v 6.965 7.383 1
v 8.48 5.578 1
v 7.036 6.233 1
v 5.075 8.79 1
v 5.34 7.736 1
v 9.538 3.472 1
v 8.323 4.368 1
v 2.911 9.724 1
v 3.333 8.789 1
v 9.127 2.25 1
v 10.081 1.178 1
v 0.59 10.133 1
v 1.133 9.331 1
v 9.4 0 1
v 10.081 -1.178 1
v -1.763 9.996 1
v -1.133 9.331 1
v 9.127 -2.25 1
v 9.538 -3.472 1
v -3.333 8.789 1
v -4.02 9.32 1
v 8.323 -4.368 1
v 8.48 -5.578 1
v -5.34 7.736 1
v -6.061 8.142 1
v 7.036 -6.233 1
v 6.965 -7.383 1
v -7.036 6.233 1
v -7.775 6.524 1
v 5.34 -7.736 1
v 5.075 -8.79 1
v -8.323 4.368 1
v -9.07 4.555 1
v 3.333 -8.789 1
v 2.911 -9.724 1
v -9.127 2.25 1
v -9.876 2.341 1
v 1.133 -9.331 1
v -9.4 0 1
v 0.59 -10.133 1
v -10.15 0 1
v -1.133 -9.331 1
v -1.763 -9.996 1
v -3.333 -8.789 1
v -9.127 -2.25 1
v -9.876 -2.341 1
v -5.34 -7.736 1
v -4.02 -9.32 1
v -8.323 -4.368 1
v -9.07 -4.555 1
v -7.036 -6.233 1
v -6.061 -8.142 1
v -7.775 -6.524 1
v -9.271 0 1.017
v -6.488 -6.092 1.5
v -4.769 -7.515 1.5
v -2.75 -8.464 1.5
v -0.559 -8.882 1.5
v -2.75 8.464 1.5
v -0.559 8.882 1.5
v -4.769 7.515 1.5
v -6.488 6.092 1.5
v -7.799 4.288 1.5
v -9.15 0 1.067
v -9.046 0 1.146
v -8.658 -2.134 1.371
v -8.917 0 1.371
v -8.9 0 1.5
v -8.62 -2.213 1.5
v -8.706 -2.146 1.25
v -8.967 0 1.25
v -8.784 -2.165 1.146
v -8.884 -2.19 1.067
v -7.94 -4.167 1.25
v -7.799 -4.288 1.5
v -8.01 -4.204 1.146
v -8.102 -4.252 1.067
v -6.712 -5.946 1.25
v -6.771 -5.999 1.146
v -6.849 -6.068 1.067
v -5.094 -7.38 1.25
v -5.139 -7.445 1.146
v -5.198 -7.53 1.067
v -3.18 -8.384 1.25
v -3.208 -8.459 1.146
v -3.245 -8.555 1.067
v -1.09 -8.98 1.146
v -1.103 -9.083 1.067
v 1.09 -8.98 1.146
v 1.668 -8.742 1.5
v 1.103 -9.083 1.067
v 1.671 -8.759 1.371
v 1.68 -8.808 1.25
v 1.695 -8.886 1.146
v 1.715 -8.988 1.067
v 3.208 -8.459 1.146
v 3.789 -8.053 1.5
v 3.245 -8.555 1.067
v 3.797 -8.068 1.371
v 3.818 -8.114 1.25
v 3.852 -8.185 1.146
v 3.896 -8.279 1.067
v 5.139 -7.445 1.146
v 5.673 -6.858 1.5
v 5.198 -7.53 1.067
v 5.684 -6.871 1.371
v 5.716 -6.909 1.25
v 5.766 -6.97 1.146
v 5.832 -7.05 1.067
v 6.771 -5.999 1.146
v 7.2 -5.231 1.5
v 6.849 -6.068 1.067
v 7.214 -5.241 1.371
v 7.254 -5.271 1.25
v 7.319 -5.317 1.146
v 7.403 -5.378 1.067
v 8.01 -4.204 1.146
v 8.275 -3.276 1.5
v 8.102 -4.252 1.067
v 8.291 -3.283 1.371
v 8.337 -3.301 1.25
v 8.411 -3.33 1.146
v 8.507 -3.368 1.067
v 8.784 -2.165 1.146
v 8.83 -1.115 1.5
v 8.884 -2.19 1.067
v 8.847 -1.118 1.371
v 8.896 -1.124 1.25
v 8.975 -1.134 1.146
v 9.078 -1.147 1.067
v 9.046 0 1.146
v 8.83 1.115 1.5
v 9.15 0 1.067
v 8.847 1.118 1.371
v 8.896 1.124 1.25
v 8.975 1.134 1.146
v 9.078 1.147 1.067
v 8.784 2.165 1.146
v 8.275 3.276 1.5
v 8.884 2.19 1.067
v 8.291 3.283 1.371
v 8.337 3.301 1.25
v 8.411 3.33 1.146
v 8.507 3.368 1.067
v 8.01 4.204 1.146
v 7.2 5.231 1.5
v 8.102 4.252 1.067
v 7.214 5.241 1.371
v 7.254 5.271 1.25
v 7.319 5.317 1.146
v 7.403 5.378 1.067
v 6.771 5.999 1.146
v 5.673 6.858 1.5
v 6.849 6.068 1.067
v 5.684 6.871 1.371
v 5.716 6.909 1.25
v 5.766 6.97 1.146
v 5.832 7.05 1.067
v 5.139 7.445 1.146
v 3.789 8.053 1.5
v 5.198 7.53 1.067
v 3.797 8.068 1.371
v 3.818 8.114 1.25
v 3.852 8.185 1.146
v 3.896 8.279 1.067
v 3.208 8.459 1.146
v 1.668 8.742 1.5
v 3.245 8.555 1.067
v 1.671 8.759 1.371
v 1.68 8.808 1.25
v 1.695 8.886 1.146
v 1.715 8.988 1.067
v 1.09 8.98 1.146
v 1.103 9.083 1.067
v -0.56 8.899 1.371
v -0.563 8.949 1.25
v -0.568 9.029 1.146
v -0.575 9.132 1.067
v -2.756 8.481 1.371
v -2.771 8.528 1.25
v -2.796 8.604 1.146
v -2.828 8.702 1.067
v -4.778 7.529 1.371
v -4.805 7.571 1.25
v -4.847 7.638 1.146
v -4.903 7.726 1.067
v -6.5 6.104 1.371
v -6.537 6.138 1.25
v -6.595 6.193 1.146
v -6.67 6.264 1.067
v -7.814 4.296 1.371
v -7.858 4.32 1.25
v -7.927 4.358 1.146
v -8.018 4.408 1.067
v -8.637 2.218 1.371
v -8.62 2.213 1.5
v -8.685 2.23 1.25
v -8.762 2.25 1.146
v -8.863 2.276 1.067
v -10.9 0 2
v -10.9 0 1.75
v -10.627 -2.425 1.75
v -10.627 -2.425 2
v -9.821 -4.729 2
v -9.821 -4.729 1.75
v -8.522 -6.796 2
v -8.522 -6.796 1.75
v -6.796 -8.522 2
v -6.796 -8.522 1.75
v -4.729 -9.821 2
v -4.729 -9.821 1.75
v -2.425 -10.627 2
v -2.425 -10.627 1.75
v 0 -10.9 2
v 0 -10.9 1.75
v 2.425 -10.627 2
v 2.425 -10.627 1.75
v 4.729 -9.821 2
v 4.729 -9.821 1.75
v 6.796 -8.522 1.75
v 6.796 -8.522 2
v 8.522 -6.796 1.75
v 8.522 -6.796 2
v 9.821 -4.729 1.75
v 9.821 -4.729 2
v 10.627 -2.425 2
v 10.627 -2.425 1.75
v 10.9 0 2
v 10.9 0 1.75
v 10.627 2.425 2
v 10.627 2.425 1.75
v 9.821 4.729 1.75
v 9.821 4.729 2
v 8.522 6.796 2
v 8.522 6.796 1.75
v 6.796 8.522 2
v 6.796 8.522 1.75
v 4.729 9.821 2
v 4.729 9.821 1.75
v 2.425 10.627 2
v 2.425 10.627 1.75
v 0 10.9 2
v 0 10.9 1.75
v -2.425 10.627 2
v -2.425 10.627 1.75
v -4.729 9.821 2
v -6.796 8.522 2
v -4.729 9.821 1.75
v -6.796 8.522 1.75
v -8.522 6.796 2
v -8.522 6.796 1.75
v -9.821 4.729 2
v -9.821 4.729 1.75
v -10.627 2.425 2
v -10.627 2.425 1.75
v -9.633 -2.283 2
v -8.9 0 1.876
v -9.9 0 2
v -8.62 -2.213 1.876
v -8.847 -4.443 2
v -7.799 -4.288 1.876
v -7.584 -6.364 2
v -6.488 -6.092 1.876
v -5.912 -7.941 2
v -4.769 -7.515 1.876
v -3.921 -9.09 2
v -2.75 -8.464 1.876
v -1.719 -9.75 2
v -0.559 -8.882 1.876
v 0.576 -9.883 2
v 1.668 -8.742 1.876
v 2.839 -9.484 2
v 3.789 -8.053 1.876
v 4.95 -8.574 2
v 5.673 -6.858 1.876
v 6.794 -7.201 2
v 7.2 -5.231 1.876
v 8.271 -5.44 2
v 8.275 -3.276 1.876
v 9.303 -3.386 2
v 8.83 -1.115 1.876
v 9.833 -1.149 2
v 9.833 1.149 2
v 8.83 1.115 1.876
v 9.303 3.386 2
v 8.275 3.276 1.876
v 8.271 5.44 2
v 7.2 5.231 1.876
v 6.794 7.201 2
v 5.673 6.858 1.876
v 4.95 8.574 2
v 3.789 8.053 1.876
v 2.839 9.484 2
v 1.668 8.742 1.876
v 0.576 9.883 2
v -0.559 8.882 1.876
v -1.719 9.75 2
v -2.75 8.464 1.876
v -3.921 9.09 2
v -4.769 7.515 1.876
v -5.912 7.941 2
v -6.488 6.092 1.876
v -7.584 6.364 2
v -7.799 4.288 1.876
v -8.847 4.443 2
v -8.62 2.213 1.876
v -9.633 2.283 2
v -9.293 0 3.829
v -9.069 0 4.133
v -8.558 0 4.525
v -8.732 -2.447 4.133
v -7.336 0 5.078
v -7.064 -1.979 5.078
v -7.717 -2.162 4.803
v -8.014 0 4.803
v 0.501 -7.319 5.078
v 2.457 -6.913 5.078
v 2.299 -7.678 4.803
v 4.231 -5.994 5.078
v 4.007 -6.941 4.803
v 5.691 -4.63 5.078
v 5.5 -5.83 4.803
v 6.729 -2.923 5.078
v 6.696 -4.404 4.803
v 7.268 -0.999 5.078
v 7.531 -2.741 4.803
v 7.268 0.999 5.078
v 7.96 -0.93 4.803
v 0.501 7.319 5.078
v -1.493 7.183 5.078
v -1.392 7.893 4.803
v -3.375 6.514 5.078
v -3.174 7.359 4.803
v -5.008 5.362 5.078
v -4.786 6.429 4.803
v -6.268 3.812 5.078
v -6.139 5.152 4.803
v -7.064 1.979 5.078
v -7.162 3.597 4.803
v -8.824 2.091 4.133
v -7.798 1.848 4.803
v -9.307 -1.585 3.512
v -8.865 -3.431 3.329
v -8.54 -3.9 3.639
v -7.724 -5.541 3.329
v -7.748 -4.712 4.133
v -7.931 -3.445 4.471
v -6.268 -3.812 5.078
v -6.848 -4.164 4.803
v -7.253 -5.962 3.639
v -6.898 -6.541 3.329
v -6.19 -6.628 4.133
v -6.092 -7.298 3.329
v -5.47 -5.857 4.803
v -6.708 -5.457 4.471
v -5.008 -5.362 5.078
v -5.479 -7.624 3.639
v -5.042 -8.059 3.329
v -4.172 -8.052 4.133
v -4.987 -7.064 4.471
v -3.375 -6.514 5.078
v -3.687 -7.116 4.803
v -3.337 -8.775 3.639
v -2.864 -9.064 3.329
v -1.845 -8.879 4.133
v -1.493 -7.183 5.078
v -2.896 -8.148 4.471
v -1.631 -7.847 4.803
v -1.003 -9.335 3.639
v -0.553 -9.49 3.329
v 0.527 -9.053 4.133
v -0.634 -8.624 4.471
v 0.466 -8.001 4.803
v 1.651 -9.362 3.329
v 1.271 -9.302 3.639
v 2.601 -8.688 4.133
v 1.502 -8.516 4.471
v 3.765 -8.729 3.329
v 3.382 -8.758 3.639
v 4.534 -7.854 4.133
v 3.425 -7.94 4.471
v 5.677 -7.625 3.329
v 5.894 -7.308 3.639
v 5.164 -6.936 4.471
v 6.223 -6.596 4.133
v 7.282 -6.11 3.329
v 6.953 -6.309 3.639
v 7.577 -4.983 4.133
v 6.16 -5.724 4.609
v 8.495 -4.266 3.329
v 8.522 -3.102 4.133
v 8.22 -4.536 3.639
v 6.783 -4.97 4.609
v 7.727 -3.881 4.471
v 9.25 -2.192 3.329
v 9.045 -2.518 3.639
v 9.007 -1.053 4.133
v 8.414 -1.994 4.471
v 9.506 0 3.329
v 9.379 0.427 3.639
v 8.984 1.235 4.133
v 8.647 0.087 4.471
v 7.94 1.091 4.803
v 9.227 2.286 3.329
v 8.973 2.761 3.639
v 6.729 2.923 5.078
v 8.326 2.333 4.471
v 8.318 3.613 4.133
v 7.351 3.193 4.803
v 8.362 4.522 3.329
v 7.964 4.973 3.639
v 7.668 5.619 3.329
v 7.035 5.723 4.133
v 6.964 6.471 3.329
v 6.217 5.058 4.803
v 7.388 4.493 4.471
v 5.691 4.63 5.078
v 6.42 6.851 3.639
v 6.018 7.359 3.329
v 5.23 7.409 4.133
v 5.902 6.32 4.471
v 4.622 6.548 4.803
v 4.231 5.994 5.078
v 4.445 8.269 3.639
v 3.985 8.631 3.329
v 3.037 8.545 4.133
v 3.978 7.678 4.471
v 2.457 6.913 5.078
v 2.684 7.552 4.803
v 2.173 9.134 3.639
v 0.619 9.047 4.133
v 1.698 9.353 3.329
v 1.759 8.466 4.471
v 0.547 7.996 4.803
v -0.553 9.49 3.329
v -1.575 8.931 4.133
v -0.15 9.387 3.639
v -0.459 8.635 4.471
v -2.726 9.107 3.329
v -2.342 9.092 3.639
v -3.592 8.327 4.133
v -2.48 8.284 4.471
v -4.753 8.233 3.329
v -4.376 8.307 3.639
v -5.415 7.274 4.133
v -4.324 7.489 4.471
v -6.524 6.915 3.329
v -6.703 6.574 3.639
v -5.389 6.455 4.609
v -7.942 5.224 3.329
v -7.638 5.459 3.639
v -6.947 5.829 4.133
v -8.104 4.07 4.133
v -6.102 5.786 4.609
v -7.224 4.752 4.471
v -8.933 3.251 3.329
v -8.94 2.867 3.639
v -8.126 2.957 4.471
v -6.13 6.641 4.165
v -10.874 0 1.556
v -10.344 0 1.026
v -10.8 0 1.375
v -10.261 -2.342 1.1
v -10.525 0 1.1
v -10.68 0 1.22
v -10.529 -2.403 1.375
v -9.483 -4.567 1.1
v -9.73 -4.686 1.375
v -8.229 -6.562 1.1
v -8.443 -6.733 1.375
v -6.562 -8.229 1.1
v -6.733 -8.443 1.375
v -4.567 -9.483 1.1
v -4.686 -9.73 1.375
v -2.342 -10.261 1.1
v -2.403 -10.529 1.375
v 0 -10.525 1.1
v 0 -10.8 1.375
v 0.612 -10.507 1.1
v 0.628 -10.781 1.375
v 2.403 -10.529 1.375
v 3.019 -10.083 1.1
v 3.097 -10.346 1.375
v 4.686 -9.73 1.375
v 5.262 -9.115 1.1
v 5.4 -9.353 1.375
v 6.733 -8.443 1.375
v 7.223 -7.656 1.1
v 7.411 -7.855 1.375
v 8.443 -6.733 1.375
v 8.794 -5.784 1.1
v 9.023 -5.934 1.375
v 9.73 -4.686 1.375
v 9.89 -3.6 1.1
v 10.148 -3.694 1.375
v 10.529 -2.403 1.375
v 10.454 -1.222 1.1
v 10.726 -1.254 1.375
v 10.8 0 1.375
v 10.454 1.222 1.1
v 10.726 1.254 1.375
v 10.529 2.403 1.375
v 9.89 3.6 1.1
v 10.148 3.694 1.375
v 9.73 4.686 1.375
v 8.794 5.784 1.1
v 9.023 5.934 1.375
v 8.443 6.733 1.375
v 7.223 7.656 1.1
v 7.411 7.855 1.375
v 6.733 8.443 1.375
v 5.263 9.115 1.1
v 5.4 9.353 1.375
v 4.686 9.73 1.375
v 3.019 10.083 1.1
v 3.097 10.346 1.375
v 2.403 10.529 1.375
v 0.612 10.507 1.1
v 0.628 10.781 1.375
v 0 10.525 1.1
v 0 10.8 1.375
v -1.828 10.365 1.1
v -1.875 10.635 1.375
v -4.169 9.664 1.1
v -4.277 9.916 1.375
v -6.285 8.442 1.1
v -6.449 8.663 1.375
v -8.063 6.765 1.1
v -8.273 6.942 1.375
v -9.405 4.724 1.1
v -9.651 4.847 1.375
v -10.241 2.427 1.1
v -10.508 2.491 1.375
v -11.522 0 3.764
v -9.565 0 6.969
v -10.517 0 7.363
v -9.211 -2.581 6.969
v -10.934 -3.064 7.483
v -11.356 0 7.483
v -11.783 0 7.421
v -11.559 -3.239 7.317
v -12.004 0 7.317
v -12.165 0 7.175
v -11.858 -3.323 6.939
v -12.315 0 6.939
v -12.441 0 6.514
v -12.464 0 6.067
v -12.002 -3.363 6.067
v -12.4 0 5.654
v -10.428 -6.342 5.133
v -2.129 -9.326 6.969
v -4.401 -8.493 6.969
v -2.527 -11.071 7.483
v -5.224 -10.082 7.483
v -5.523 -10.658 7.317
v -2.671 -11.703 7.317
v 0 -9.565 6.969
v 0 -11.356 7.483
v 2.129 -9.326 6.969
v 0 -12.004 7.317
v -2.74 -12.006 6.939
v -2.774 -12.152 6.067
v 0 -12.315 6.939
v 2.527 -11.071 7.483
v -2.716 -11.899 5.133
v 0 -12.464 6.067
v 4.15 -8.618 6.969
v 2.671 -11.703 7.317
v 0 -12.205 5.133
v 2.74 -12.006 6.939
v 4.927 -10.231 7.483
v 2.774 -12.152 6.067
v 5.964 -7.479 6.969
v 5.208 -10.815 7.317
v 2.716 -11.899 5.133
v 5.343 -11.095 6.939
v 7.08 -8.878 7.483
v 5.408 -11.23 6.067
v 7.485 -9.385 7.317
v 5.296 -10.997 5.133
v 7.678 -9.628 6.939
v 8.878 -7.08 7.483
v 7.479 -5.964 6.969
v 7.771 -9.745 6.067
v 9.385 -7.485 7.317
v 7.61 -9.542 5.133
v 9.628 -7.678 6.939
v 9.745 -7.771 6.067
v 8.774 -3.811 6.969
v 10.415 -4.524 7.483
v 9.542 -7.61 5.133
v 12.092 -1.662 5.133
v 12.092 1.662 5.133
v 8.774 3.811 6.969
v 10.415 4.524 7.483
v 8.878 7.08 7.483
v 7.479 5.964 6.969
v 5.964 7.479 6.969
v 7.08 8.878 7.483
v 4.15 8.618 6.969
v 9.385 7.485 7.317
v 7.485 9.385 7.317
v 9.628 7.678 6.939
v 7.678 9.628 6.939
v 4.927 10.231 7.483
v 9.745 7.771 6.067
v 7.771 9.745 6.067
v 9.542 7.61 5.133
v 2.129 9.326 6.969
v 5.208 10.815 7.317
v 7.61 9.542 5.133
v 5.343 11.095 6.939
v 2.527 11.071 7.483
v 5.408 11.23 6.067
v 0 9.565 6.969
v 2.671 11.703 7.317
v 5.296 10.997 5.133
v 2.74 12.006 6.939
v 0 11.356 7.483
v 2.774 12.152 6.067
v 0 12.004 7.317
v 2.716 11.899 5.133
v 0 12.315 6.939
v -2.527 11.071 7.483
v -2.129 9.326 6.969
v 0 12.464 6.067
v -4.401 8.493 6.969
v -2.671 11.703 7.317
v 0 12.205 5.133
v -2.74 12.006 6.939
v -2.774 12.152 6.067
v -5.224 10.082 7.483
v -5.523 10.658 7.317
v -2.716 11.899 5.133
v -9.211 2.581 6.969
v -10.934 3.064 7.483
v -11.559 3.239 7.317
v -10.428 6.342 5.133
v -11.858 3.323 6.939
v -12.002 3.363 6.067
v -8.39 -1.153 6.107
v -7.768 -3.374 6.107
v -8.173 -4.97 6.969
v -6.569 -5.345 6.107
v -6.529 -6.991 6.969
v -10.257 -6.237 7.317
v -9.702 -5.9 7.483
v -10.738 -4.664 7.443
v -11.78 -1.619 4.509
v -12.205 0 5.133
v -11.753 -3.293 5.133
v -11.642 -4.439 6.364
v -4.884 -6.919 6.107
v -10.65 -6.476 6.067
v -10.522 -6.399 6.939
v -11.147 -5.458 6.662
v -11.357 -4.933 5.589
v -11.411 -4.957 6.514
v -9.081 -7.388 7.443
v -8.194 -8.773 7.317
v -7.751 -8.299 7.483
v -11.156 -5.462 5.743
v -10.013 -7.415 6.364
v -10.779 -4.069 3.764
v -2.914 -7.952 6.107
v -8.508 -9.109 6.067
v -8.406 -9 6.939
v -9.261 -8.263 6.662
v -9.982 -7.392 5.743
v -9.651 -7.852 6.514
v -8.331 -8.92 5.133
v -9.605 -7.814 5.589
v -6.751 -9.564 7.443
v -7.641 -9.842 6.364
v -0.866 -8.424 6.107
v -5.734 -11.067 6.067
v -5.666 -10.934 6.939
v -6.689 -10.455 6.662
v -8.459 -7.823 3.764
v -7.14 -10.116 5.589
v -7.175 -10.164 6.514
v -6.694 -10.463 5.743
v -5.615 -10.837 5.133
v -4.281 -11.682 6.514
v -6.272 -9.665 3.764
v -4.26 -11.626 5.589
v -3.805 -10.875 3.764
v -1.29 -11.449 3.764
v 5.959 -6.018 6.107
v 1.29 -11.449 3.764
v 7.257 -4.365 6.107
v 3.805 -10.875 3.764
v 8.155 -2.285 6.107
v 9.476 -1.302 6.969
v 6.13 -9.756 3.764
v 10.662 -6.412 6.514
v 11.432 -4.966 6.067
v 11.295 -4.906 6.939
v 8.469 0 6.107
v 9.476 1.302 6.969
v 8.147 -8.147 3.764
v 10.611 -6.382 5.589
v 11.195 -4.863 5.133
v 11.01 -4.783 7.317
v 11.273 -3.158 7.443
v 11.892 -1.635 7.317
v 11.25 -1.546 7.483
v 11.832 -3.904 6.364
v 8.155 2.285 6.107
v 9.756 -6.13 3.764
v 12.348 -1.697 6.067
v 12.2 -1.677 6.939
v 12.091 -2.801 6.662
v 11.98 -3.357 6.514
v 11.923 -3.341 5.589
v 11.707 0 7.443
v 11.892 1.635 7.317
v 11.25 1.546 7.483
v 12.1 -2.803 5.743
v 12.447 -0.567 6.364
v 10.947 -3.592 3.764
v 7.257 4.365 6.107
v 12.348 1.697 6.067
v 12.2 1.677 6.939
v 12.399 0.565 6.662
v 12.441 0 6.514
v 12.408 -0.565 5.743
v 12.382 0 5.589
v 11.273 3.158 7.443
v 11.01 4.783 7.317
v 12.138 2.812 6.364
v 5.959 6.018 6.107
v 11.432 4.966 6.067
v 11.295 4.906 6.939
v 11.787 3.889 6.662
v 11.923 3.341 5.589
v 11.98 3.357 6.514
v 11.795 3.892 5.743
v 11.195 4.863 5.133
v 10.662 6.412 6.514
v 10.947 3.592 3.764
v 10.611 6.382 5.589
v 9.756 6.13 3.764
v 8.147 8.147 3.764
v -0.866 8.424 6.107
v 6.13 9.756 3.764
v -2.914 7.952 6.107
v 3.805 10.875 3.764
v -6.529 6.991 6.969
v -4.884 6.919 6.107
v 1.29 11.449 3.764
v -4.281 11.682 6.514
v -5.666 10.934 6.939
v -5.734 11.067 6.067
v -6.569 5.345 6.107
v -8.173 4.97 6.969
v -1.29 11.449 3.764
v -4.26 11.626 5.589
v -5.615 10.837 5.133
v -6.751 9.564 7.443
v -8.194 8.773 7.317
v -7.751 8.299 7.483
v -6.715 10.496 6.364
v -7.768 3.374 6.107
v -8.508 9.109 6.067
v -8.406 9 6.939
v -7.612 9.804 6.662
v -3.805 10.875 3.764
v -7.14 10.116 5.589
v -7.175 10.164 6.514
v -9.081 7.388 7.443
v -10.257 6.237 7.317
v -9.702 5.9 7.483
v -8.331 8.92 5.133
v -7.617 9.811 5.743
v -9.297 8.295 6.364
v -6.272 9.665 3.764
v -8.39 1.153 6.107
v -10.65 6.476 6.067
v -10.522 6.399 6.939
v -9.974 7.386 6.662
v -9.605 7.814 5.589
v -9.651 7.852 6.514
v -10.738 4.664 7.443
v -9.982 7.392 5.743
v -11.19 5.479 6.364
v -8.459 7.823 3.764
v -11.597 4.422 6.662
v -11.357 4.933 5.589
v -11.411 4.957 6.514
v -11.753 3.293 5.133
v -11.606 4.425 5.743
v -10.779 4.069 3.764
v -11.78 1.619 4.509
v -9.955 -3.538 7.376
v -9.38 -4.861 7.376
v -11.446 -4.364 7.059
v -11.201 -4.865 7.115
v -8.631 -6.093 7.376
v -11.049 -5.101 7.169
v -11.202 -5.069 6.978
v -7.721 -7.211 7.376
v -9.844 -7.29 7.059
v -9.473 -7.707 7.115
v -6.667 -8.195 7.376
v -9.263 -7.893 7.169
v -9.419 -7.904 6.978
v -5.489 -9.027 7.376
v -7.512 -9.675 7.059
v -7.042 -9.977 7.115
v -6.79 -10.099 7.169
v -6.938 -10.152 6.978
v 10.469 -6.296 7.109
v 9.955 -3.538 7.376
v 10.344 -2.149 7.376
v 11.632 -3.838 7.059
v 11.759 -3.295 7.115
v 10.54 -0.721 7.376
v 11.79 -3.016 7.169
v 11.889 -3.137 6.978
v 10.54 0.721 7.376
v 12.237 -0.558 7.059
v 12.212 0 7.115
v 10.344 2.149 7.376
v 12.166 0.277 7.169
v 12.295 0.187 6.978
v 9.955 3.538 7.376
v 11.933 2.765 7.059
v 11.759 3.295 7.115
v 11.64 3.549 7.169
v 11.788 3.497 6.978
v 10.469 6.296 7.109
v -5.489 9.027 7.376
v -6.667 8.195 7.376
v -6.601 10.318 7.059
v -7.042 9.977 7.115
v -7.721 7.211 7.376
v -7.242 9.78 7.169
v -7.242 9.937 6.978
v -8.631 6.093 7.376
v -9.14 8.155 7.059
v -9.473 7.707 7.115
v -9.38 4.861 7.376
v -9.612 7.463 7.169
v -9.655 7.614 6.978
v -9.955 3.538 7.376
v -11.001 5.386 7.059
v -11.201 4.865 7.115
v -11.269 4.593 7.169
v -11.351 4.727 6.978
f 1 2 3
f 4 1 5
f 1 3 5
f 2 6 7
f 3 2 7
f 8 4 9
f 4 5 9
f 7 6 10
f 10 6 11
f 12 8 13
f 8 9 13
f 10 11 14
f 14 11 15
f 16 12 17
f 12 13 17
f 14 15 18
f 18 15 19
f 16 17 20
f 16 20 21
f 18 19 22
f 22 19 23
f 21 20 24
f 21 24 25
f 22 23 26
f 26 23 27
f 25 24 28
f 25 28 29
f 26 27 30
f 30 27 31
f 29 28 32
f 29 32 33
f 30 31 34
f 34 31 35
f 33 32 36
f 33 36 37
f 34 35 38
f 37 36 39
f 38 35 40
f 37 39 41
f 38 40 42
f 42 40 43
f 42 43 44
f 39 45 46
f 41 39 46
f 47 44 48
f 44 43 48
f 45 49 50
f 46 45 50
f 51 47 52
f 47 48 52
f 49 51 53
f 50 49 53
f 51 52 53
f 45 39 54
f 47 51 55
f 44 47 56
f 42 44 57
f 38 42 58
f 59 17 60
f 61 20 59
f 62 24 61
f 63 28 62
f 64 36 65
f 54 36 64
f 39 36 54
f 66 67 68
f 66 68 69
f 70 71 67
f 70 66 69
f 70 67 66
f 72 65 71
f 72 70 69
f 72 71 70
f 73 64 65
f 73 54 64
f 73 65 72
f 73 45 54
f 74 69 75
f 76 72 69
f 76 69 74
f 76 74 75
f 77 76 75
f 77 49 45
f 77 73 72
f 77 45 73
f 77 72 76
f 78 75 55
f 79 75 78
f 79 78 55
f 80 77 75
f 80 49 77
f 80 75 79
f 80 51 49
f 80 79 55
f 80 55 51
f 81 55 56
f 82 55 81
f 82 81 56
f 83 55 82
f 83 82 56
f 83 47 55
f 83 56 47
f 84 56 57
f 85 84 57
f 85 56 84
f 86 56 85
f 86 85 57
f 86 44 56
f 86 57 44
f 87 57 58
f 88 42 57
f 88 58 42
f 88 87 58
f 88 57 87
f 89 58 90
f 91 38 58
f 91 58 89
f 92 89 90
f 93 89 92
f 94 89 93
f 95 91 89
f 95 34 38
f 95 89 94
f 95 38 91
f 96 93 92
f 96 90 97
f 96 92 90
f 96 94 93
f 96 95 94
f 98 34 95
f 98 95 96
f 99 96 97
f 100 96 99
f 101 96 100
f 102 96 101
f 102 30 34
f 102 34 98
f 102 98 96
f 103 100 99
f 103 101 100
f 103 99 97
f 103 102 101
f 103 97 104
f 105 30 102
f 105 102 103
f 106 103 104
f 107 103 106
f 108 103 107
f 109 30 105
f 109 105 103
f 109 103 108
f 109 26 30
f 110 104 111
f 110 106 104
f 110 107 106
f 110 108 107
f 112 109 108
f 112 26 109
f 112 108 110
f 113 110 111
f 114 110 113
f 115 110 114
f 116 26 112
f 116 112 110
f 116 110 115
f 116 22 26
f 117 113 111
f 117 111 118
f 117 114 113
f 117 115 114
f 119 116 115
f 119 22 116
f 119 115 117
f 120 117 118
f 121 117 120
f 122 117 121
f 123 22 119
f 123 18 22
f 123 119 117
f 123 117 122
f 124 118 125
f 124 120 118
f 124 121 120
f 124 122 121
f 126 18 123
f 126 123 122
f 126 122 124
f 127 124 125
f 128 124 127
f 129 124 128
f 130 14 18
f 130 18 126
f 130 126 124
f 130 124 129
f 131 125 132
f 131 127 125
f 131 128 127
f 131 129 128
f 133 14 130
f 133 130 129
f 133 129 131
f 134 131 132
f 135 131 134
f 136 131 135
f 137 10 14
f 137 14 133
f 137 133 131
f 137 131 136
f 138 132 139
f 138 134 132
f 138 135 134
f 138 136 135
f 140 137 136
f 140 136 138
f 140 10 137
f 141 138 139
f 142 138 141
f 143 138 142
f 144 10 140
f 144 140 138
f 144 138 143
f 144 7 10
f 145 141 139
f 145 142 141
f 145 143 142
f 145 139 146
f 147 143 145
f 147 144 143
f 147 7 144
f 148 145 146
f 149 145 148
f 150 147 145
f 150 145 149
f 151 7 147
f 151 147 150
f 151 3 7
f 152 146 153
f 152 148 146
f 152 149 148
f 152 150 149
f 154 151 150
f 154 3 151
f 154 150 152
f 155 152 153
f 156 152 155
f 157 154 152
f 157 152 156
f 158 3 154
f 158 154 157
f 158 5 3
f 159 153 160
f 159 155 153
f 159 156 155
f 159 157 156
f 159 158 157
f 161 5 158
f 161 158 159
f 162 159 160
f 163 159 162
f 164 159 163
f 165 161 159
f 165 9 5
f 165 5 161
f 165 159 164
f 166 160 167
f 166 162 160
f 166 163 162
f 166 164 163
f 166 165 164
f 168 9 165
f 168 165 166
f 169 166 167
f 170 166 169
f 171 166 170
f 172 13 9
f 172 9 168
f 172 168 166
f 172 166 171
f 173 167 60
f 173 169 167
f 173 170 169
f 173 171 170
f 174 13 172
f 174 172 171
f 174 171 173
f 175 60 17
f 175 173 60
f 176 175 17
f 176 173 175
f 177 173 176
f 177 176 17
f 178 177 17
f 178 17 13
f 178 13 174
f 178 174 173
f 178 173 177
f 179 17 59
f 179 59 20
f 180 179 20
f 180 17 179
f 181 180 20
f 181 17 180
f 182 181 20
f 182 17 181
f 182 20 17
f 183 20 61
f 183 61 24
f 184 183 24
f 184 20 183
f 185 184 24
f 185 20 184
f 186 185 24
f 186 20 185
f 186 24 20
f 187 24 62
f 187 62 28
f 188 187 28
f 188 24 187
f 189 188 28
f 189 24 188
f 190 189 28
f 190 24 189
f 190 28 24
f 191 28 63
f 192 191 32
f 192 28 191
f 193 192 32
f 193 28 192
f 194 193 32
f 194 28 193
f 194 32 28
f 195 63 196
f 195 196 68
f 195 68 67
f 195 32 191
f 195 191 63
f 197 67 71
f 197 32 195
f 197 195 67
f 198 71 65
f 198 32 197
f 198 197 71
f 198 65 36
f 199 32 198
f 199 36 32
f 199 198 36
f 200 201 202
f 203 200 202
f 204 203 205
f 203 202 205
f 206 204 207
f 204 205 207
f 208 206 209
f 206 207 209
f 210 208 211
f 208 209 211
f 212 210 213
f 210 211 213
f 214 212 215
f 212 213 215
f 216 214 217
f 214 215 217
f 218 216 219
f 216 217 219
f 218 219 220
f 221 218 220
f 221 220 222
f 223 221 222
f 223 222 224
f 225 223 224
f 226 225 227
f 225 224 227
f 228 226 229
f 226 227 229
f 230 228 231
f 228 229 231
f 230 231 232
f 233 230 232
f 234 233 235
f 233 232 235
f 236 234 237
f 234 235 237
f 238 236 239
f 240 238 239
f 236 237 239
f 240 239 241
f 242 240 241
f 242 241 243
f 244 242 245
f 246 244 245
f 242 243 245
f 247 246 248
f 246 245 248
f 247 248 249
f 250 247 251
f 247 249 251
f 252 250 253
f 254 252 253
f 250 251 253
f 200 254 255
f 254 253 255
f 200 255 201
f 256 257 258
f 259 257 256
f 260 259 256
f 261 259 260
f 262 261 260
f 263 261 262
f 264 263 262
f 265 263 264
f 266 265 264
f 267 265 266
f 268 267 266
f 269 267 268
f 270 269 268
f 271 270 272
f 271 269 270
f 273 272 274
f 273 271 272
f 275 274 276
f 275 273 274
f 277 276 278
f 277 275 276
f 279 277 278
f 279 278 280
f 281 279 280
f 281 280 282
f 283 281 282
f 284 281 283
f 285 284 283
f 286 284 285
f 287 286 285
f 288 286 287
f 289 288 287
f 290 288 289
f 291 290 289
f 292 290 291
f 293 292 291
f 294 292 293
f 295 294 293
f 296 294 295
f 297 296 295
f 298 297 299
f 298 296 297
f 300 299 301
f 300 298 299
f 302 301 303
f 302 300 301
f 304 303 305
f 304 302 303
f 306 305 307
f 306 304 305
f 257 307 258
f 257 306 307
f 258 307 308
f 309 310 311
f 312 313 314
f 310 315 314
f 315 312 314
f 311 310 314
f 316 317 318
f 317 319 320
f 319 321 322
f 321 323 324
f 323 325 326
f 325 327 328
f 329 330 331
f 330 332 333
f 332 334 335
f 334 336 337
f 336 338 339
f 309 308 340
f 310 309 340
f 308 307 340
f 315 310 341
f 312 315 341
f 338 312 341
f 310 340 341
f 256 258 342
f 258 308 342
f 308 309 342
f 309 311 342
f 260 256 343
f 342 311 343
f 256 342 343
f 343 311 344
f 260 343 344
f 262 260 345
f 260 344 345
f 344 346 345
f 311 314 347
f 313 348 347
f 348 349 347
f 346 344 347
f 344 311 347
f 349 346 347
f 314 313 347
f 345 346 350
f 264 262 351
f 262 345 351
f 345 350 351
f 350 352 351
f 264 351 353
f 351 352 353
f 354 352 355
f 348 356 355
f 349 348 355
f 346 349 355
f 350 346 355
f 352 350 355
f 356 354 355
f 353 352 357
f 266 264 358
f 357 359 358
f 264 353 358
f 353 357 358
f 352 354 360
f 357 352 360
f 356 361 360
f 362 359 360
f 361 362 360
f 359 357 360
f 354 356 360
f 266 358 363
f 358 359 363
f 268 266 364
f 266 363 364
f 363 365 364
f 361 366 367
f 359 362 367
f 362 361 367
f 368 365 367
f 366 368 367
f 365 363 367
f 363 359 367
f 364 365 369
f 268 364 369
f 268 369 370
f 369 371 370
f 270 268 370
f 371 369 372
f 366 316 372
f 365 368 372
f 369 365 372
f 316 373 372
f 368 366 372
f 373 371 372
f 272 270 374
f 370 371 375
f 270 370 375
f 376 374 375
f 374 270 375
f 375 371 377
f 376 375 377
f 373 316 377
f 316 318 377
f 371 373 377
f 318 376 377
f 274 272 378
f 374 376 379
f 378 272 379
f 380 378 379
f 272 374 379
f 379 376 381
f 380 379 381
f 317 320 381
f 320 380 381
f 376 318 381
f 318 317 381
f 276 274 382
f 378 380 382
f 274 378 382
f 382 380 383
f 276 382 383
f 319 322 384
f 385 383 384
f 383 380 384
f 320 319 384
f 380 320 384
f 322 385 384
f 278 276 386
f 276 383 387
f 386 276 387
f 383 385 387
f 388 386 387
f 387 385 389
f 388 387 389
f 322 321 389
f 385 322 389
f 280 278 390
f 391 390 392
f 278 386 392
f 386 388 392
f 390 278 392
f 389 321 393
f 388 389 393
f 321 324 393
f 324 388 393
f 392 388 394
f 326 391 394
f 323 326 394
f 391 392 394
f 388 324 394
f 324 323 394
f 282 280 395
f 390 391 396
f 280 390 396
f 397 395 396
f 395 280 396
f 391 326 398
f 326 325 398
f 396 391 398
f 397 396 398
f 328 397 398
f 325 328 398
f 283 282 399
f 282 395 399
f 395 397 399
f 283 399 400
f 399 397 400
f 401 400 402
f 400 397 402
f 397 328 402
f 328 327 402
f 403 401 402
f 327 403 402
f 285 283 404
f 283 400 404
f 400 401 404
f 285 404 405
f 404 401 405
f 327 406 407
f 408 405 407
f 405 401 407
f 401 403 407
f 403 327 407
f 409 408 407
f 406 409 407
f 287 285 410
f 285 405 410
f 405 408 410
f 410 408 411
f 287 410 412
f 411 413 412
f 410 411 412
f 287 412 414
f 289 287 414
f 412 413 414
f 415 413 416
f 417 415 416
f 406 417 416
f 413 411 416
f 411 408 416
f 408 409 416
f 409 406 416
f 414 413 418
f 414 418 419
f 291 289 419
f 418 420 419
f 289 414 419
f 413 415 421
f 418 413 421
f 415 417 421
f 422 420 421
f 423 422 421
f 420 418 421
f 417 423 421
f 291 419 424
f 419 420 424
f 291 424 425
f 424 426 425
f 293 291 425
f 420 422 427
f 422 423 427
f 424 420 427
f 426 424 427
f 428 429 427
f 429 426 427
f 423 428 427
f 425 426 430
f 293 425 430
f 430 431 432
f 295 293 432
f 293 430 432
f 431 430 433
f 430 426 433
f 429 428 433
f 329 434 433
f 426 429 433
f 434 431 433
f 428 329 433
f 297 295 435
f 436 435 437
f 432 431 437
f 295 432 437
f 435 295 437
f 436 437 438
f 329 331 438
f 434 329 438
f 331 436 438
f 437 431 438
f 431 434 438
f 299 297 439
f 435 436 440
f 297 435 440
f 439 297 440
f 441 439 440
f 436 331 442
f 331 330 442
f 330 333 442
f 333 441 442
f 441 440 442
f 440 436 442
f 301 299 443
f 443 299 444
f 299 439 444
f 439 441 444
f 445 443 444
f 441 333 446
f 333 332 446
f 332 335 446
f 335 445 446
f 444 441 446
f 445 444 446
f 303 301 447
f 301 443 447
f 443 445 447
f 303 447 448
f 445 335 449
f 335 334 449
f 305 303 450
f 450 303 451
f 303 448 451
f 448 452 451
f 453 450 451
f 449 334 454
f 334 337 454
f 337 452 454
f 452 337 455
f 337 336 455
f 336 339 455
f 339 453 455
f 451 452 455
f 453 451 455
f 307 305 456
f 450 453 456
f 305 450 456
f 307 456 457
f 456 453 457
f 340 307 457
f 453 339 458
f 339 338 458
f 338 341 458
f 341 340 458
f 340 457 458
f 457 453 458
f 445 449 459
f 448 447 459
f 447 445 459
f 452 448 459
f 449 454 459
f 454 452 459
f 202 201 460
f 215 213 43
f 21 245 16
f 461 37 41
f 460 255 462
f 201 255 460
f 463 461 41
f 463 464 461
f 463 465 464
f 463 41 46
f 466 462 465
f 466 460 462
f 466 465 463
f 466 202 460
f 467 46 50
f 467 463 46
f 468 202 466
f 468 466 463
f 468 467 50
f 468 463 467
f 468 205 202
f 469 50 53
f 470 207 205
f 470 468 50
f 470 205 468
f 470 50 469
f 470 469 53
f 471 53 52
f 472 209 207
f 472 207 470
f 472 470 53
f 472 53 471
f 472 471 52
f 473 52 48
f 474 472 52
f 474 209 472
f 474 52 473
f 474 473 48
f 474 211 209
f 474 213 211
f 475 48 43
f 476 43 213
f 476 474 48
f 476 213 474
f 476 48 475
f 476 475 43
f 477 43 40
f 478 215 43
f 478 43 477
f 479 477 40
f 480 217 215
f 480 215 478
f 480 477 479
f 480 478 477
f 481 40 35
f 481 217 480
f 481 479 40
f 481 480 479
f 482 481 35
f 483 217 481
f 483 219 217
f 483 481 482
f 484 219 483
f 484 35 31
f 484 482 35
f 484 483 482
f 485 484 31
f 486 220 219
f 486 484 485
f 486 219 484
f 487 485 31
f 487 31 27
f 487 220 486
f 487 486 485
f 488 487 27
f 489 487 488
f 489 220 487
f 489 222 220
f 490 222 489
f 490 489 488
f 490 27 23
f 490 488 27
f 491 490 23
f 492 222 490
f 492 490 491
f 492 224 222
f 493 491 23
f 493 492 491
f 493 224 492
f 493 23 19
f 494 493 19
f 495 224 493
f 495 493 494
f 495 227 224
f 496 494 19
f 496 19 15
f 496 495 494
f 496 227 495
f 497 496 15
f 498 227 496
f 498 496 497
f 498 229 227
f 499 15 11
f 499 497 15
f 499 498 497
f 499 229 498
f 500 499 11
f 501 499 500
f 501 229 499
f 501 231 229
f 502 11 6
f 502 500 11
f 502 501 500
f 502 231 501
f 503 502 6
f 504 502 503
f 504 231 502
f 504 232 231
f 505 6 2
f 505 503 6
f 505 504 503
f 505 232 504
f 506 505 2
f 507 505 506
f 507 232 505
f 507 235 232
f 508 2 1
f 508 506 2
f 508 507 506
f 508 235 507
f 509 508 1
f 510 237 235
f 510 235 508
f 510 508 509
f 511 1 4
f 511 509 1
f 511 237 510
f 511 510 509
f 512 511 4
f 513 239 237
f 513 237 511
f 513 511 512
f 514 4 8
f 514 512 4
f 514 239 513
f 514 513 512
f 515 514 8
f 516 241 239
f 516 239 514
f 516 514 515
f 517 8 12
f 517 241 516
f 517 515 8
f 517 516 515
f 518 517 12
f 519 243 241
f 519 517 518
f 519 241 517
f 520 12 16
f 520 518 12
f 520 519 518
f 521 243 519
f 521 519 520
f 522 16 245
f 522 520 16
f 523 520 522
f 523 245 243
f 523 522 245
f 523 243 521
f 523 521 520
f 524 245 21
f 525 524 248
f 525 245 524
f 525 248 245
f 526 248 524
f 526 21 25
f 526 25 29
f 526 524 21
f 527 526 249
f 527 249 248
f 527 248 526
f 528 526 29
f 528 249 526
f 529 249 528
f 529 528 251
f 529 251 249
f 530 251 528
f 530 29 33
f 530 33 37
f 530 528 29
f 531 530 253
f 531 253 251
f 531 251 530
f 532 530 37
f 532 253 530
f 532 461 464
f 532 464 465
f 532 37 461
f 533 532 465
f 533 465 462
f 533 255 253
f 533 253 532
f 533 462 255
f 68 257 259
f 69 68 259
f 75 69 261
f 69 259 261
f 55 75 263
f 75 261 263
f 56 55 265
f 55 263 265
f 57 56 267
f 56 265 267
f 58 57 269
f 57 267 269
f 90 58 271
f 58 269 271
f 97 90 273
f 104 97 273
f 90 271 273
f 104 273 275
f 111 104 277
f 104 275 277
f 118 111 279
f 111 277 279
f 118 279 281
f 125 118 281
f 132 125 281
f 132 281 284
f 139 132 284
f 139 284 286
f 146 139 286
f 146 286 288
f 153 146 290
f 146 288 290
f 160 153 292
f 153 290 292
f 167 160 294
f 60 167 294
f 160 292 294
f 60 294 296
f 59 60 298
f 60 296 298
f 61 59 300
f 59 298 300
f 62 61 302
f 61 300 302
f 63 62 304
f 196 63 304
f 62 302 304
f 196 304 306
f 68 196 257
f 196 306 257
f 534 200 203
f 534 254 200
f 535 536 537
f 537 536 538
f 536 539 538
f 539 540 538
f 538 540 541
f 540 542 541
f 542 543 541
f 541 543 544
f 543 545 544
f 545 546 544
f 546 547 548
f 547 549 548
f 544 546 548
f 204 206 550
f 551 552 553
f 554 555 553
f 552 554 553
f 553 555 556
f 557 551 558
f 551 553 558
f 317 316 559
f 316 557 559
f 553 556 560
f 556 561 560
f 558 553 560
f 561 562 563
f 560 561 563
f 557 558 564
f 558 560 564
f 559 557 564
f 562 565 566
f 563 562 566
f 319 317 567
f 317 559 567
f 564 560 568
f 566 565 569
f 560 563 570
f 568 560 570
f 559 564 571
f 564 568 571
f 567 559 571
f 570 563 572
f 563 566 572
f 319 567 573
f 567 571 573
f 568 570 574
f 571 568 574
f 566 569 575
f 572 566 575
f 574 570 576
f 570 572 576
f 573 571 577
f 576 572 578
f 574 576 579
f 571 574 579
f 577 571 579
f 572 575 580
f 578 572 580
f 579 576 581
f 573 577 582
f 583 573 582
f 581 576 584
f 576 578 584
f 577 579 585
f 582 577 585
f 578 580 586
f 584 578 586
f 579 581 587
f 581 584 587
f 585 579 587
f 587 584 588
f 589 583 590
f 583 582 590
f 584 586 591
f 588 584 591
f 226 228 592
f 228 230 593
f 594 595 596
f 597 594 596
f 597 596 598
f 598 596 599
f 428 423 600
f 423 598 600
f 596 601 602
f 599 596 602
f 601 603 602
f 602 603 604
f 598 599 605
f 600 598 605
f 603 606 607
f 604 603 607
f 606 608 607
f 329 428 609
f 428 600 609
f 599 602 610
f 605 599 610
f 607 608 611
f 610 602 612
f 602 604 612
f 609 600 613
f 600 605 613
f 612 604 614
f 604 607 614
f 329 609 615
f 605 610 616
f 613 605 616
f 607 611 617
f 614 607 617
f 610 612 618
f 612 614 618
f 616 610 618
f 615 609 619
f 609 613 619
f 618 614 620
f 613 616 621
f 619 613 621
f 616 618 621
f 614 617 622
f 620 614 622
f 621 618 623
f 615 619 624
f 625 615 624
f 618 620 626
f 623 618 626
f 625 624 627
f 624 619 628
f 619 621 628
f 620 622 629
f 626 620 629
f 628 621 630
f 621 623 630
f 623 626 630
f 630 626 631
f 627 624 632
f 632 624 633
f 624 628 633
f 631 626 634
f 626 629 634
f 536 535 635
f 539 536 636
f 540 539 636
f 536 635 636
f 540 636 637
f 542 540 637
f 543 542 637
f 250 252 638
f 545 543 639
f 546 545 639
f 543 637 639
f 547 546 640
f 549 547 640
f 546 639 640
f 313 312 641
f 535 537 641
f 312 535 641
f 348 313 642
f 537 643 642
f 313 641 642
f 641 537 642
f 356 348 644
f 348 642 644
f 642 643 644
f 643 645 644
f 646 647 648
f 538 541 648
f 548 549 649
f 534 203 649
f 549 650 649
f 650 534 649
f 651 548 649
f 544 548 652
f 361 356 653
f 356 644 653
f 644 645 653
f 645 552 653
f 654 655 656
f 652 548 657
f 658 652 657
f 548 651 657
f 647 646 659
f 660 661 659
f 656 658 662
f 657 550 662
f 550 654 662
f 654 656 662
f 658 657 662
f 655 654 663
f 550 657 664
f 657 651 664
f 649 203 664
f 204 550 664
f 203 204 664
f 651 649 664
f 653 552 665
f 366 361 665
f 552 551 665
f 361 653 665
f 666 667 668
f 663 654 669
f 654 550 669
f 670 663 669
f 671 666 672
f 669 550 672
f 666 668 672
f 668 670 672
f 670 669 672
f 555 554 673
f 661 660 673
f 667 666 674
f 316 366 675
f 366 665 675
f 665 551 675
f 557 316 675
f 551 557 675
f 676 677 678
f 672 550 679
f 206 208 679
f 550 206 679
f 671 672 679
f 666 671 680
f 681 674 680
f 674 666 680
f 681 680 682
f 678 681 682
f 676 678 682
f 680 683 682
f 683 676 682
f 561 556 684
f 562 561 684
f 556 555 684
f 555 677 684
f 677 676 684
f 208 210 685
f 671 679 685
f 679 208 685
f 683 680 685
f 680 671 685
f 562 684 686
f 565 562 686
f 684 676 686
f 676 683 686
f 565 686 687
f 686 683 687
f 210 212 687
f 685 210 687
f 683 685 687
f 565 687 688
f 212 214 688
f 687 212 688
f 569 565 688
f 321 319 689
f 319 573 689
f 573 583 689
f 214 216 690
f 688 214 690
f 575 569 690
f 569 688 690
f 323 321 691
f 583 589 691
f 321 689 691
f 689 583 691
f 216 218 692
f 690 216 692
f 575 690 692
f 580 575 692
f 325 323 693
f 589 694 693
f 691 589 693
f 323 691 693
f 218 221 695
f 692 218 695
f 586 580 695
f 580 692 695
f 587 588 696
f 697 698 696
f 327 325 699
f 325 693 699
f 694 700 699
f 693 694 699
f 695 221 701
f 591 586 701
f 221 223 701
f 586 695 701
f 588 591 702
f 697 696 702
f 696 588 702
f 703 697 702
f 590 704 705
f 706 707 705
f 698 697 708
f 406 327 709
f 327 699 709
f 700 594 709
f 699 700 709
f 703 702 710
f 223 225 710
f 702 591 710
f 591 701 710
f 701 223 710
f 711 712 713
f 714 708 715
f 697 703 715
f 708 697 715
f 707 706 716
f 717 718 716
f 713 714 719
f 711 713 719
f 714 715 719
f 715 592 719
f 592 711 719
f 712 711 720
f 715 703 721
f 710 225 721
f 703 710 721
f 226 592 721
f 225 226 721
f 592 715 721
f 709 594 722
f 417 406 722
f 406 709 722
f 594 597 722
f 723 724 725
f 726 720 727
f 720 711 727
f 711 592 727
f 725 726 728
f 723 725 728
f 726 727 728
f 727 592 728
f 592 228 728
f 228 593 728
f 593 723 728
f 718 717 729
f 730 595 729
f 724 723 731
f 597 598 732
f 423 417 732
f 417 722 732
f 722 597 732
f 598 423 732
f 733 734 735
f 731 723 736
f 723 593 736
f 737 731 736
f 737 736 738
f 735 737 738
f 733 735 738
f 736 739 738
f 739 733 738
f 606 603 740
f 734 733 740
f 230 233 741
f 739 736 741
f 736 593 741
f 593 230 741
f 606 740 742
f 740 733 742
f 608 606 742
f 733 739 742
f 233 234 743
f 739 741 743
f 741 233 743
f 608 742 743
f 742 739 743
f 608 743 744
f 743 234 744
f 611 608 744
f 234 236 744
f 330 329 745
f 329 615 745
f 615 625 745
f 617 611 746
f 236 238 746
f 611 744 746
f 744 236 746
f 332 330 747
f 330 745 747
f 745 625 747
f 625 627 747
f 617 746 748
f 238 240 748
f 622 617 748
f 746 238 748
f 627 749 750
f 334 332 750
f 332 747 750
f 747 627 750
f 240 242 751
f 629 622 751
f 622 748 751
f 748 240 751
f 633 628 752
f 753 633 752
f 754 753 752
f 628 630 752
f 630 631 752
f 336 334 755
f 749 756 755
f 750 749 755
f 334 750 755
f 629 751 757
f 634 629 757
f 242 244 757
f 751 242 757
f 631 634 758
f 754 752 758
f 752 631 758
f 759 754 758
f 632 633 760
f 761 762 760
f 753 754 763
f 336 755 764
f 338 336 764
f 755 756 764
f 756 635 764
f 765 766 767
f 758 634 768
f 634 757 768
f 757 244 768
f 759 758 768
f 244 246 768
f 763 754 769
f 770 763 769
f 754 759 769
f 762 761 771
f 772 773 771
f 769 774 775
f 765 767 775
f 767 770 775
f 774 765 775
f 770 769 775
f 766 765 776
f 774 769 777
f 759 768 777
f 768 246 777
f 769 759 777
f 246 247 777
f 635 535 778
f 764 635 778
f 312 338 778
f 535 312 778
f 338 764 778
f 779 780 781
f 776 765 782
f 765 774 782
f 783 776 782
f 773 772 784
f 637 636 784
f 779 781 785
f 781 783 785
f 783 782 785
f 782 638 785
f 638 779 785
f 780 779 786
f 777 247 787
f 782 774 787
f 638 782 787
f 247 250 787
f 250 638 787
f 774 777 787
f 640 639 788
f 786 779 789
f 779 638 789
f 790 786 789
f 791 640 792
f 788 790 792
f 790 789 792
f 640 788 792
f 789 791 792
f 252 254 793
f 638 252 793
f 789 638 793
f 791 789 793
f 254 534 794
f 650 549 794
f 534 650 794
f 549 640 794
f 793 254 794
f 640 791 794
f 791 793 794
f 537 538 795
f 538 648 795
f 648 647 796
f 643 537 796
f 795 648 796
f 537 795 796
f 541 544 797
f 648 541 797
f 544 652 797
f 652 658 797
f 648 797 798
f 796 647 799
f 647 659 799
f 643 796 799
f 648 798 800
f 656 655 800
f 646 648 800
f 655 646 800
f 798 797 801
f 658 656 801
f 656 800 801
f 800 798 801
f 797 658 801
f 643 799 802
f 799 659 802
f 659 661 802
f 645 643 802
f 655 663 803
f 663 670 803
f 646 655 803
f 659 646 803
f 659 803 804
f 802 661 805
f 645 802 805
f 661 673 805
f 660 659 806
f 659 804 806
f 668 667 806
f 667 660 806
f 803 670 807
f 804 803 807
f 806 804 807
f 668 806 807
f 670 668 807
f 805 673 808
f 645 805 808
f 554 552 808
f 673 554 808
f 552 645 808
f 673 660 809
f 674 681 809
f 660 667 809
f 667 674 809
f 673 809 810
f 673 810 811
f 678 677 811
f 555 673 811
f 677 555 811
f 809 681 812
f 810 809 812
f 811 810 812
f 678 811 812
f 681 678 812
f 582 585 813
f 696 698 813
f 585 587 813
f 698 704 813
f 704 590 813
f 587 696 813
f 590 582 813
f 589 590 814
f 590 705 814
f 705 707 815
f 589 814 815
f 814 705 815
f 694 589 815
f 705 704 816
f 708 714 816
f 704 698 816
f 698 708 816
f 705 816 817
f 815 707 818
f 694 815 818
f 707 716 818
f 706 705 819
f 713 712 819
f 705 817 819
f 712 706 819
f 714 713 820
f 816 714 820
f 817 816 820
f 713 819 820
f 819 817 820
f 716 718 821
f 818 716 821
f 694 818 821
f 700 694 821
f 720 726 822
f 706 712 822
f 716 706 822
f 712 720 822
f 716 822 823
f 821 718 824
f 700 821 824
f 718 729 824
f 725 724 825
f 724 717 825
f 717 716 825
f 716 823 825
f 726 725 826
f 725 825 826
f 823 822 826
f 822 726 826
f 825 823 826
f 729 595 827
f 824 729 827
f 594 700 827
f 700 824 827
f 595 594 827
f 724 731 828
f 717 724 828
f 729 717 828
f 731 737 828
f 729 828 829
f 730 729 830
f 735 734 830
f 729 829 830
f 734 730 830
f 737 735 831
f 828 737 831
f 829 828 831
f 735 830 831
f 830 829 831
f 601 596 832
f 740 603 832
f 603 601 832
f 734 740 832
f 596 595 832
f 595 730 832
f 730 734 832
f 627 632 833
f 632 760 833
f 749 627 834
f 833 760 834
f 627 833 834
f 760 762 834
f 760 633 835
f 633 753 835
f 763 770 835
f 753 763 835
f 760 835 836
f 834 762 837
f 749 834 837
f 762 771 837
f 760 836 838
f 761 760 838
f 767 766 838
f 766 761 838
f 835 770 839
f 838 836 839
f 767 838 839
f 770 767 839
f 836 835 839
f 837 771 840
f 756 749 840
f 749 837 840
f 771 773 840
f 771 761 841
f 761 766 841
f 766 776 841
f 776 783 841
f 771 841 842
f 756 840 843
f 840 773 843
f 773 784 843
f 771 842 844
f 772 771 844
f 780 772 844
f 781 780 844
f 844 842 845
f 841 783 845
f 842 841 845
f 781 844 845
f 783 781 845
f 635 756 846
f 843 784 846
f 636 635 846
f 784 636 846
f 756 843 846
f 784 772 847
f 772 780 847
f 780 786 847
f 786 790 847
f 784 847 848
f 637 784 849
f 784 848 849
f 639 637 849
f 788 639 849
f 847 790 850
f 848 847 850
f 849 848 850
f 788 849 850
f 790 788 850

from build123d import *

# Parameters (mm, degrees)
F3_R = 0.5
F4_R = 0.75


with BuildPart() as f1:
    # F0 (on Front) → F1 (revolve)
    with BuildSketch(Plane.XZ):
        with BuildLine():
            add(Edge.make_bspline(
                [(-9.9, 2), (-9.5758501784, 2), (-9.2390440685, 1.9540368163), (-8.9, 1.8756836241)],
                knots=[0, 0, 0, 0, 0.9057827175, 0.9057827175, 0.9057827175, 0.9057827175], degree=3))
            add(Edge.make_bspline(
                [(-9.9, 2), (-9.4425315337, 3.4727421793), (-9.475417137, 4.1546168904), (-7.8504308779, 4.8879319086), (-7.3364856621, 5.0781547656)],
                knots=[0, 0, 0, 0, 0.3609898147, 0.4924868102, 0.4924868102, 0.4924868102, 0.4924868102], degree=3))
            add(Edge.make_bspline(
                [(-7.3364856621, 5.0781547656), (-7.8661996988, 5.5186899413), (-8.9848796151, 6.6731469392), (-10.2827477013, 7.4070818452), (-12.2553368007, 7.6610451612), (-12.6137007512, 5.9133238981), (-11.9614741658, 4.6431108193), (-11.1182323438, 3.0212863117), (-10.9, 2)],
                knots=[0, 0, 0, 0, 0.1855602792, 0.3413856413, 0.4983155684, 0.6419424505, 0.7899465755, 1, 1, 1, 1], degree=3))
            Line((-10.9, 2), (-10.9, 1))
            Line((-10.9, 1), (-8.9, 1))
            Line((-8.9, 1), (-8.9, 1.8756836241))
        make_face()
    revolve(axis=Axis((0, 0, 3.25), (0, 0, 1)))

    # F3
    f3_edges = [f1.edges().sort_by_distance(p)[0] for p in [
        (8.9, 0, 1),
    ]]
    fillet(f3_edges, radius=F3_R)

    # F4
    f4_edges = [f1.edges().sort_by_distance(p)[0] for p in [
        (10.9, 0, 1),
    ]]
    fillet(f4_edges, radius=F4_R)


solid = f1.part
